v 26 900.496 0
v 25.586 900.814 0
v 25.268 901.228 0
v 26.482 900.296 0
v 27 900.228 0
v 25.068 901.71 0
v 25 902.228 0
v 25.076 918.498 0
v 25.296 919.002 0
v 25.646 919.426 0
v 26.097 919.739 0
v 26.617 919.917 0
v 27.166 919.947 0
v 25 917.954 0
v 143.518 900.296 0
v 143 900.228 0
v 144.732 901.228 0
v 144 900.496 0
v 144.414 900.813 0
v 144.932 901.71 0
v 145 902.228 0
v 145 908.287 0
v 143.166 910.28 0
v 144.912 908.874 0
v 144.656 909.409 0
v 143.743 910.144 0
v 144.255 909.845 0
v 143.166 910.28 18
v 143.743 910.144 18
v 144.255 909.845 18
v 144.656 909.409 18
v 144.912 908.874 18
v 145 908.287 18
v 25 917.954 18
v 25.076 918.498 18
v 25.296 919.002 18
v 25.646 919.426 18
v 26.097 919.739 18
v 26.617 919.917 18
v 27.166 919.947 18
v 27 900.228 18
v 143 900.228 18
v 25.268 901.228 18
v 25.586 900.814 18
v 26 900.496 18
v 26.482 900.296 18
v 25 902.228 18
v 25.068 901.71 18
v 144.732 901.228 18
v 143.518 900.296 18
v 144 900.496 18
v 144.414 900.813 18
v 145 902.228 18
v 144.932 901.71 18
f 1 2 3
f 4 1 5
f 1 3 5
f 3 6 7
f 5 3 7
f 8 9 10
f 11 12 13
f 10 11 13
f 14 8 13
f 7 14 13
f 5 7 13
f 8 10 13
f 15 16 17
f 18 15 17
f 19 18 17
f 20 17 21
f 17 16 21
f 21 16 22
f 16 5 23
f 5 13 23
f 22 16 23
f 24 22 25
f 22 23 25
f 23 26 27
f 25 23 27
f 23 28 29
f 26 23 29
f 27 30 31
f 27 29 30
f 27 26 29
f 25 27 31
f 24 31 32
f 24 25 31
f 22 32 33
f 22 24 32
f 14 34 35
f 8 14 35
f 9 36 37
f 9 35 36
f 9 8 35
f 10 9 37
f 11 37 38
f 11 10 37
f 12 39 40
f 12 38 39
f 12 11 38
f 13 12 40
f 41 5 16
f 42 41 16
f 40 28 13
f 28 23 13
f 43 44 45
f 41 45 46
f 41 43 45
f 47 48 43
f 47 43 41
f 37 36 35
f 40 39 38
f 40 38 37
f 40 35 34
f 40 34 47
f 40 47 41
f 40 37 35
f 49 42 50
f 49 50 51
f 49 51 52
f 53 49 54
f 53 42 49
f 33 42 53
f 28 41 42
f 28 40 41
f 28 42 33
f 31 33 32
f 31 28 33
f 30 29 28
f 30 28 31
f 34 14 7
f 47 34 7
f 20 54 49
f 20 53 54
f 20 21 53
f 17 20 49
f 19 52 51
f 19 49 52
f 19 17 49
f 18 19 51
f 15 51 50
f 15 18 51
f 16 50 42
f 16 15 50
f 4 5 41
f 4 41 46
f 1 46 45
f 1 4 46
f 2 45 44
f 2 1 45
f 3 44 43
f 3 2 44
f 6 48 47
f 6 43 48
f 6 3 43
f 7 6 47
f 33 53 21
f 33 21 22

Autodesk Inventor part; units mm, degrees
ref_plane "YZ Plane" through (0, 0, 0) normal (1, 0, 0) x (0, 1, 0)
ref_plane "XZ Plane" through (0, 0, 0) normal (0, 1, 0) x (-1, 0, 0)
ref_plane "XY Plane" through (0, 0, 0) normal (0, 0, 1) x (1, 0, 0)
sketch "CONTOURS" plane through (0, 0, 0) normal (0, 0, 1) x (1, 0, 0)
  line L0 (25, 917.9541) -> (25, 902.2281)
  arc A0 (25, 902.2281) -> (27, 900.2277) centre (27, 902.2277) ccw
  line L1 (27, 900.2277) -> (143, 900.2277)
  arc A1 (143, 900.2277) -> (145, 902.2277) centre (143, 902.2277) ccw
  line L2 (145, 902.2277) -> (145, 908.2874)
  arc A2 (145, 908.2874) -> (143.1661, 910.2805) centre (143, 908.2874) ccw
  line L3 (143.1661, 910.2805) -> (27.1661, 919.9472)
  arc A3 (27.1661, 919.9472) -> (25, 917.9541) centre (27, 917.9541) ccw
extrude "Extrusion1" add sketch "CONTOURS" along normal blind 18
properties part number "Wedge" material "Wood (Birch)"
